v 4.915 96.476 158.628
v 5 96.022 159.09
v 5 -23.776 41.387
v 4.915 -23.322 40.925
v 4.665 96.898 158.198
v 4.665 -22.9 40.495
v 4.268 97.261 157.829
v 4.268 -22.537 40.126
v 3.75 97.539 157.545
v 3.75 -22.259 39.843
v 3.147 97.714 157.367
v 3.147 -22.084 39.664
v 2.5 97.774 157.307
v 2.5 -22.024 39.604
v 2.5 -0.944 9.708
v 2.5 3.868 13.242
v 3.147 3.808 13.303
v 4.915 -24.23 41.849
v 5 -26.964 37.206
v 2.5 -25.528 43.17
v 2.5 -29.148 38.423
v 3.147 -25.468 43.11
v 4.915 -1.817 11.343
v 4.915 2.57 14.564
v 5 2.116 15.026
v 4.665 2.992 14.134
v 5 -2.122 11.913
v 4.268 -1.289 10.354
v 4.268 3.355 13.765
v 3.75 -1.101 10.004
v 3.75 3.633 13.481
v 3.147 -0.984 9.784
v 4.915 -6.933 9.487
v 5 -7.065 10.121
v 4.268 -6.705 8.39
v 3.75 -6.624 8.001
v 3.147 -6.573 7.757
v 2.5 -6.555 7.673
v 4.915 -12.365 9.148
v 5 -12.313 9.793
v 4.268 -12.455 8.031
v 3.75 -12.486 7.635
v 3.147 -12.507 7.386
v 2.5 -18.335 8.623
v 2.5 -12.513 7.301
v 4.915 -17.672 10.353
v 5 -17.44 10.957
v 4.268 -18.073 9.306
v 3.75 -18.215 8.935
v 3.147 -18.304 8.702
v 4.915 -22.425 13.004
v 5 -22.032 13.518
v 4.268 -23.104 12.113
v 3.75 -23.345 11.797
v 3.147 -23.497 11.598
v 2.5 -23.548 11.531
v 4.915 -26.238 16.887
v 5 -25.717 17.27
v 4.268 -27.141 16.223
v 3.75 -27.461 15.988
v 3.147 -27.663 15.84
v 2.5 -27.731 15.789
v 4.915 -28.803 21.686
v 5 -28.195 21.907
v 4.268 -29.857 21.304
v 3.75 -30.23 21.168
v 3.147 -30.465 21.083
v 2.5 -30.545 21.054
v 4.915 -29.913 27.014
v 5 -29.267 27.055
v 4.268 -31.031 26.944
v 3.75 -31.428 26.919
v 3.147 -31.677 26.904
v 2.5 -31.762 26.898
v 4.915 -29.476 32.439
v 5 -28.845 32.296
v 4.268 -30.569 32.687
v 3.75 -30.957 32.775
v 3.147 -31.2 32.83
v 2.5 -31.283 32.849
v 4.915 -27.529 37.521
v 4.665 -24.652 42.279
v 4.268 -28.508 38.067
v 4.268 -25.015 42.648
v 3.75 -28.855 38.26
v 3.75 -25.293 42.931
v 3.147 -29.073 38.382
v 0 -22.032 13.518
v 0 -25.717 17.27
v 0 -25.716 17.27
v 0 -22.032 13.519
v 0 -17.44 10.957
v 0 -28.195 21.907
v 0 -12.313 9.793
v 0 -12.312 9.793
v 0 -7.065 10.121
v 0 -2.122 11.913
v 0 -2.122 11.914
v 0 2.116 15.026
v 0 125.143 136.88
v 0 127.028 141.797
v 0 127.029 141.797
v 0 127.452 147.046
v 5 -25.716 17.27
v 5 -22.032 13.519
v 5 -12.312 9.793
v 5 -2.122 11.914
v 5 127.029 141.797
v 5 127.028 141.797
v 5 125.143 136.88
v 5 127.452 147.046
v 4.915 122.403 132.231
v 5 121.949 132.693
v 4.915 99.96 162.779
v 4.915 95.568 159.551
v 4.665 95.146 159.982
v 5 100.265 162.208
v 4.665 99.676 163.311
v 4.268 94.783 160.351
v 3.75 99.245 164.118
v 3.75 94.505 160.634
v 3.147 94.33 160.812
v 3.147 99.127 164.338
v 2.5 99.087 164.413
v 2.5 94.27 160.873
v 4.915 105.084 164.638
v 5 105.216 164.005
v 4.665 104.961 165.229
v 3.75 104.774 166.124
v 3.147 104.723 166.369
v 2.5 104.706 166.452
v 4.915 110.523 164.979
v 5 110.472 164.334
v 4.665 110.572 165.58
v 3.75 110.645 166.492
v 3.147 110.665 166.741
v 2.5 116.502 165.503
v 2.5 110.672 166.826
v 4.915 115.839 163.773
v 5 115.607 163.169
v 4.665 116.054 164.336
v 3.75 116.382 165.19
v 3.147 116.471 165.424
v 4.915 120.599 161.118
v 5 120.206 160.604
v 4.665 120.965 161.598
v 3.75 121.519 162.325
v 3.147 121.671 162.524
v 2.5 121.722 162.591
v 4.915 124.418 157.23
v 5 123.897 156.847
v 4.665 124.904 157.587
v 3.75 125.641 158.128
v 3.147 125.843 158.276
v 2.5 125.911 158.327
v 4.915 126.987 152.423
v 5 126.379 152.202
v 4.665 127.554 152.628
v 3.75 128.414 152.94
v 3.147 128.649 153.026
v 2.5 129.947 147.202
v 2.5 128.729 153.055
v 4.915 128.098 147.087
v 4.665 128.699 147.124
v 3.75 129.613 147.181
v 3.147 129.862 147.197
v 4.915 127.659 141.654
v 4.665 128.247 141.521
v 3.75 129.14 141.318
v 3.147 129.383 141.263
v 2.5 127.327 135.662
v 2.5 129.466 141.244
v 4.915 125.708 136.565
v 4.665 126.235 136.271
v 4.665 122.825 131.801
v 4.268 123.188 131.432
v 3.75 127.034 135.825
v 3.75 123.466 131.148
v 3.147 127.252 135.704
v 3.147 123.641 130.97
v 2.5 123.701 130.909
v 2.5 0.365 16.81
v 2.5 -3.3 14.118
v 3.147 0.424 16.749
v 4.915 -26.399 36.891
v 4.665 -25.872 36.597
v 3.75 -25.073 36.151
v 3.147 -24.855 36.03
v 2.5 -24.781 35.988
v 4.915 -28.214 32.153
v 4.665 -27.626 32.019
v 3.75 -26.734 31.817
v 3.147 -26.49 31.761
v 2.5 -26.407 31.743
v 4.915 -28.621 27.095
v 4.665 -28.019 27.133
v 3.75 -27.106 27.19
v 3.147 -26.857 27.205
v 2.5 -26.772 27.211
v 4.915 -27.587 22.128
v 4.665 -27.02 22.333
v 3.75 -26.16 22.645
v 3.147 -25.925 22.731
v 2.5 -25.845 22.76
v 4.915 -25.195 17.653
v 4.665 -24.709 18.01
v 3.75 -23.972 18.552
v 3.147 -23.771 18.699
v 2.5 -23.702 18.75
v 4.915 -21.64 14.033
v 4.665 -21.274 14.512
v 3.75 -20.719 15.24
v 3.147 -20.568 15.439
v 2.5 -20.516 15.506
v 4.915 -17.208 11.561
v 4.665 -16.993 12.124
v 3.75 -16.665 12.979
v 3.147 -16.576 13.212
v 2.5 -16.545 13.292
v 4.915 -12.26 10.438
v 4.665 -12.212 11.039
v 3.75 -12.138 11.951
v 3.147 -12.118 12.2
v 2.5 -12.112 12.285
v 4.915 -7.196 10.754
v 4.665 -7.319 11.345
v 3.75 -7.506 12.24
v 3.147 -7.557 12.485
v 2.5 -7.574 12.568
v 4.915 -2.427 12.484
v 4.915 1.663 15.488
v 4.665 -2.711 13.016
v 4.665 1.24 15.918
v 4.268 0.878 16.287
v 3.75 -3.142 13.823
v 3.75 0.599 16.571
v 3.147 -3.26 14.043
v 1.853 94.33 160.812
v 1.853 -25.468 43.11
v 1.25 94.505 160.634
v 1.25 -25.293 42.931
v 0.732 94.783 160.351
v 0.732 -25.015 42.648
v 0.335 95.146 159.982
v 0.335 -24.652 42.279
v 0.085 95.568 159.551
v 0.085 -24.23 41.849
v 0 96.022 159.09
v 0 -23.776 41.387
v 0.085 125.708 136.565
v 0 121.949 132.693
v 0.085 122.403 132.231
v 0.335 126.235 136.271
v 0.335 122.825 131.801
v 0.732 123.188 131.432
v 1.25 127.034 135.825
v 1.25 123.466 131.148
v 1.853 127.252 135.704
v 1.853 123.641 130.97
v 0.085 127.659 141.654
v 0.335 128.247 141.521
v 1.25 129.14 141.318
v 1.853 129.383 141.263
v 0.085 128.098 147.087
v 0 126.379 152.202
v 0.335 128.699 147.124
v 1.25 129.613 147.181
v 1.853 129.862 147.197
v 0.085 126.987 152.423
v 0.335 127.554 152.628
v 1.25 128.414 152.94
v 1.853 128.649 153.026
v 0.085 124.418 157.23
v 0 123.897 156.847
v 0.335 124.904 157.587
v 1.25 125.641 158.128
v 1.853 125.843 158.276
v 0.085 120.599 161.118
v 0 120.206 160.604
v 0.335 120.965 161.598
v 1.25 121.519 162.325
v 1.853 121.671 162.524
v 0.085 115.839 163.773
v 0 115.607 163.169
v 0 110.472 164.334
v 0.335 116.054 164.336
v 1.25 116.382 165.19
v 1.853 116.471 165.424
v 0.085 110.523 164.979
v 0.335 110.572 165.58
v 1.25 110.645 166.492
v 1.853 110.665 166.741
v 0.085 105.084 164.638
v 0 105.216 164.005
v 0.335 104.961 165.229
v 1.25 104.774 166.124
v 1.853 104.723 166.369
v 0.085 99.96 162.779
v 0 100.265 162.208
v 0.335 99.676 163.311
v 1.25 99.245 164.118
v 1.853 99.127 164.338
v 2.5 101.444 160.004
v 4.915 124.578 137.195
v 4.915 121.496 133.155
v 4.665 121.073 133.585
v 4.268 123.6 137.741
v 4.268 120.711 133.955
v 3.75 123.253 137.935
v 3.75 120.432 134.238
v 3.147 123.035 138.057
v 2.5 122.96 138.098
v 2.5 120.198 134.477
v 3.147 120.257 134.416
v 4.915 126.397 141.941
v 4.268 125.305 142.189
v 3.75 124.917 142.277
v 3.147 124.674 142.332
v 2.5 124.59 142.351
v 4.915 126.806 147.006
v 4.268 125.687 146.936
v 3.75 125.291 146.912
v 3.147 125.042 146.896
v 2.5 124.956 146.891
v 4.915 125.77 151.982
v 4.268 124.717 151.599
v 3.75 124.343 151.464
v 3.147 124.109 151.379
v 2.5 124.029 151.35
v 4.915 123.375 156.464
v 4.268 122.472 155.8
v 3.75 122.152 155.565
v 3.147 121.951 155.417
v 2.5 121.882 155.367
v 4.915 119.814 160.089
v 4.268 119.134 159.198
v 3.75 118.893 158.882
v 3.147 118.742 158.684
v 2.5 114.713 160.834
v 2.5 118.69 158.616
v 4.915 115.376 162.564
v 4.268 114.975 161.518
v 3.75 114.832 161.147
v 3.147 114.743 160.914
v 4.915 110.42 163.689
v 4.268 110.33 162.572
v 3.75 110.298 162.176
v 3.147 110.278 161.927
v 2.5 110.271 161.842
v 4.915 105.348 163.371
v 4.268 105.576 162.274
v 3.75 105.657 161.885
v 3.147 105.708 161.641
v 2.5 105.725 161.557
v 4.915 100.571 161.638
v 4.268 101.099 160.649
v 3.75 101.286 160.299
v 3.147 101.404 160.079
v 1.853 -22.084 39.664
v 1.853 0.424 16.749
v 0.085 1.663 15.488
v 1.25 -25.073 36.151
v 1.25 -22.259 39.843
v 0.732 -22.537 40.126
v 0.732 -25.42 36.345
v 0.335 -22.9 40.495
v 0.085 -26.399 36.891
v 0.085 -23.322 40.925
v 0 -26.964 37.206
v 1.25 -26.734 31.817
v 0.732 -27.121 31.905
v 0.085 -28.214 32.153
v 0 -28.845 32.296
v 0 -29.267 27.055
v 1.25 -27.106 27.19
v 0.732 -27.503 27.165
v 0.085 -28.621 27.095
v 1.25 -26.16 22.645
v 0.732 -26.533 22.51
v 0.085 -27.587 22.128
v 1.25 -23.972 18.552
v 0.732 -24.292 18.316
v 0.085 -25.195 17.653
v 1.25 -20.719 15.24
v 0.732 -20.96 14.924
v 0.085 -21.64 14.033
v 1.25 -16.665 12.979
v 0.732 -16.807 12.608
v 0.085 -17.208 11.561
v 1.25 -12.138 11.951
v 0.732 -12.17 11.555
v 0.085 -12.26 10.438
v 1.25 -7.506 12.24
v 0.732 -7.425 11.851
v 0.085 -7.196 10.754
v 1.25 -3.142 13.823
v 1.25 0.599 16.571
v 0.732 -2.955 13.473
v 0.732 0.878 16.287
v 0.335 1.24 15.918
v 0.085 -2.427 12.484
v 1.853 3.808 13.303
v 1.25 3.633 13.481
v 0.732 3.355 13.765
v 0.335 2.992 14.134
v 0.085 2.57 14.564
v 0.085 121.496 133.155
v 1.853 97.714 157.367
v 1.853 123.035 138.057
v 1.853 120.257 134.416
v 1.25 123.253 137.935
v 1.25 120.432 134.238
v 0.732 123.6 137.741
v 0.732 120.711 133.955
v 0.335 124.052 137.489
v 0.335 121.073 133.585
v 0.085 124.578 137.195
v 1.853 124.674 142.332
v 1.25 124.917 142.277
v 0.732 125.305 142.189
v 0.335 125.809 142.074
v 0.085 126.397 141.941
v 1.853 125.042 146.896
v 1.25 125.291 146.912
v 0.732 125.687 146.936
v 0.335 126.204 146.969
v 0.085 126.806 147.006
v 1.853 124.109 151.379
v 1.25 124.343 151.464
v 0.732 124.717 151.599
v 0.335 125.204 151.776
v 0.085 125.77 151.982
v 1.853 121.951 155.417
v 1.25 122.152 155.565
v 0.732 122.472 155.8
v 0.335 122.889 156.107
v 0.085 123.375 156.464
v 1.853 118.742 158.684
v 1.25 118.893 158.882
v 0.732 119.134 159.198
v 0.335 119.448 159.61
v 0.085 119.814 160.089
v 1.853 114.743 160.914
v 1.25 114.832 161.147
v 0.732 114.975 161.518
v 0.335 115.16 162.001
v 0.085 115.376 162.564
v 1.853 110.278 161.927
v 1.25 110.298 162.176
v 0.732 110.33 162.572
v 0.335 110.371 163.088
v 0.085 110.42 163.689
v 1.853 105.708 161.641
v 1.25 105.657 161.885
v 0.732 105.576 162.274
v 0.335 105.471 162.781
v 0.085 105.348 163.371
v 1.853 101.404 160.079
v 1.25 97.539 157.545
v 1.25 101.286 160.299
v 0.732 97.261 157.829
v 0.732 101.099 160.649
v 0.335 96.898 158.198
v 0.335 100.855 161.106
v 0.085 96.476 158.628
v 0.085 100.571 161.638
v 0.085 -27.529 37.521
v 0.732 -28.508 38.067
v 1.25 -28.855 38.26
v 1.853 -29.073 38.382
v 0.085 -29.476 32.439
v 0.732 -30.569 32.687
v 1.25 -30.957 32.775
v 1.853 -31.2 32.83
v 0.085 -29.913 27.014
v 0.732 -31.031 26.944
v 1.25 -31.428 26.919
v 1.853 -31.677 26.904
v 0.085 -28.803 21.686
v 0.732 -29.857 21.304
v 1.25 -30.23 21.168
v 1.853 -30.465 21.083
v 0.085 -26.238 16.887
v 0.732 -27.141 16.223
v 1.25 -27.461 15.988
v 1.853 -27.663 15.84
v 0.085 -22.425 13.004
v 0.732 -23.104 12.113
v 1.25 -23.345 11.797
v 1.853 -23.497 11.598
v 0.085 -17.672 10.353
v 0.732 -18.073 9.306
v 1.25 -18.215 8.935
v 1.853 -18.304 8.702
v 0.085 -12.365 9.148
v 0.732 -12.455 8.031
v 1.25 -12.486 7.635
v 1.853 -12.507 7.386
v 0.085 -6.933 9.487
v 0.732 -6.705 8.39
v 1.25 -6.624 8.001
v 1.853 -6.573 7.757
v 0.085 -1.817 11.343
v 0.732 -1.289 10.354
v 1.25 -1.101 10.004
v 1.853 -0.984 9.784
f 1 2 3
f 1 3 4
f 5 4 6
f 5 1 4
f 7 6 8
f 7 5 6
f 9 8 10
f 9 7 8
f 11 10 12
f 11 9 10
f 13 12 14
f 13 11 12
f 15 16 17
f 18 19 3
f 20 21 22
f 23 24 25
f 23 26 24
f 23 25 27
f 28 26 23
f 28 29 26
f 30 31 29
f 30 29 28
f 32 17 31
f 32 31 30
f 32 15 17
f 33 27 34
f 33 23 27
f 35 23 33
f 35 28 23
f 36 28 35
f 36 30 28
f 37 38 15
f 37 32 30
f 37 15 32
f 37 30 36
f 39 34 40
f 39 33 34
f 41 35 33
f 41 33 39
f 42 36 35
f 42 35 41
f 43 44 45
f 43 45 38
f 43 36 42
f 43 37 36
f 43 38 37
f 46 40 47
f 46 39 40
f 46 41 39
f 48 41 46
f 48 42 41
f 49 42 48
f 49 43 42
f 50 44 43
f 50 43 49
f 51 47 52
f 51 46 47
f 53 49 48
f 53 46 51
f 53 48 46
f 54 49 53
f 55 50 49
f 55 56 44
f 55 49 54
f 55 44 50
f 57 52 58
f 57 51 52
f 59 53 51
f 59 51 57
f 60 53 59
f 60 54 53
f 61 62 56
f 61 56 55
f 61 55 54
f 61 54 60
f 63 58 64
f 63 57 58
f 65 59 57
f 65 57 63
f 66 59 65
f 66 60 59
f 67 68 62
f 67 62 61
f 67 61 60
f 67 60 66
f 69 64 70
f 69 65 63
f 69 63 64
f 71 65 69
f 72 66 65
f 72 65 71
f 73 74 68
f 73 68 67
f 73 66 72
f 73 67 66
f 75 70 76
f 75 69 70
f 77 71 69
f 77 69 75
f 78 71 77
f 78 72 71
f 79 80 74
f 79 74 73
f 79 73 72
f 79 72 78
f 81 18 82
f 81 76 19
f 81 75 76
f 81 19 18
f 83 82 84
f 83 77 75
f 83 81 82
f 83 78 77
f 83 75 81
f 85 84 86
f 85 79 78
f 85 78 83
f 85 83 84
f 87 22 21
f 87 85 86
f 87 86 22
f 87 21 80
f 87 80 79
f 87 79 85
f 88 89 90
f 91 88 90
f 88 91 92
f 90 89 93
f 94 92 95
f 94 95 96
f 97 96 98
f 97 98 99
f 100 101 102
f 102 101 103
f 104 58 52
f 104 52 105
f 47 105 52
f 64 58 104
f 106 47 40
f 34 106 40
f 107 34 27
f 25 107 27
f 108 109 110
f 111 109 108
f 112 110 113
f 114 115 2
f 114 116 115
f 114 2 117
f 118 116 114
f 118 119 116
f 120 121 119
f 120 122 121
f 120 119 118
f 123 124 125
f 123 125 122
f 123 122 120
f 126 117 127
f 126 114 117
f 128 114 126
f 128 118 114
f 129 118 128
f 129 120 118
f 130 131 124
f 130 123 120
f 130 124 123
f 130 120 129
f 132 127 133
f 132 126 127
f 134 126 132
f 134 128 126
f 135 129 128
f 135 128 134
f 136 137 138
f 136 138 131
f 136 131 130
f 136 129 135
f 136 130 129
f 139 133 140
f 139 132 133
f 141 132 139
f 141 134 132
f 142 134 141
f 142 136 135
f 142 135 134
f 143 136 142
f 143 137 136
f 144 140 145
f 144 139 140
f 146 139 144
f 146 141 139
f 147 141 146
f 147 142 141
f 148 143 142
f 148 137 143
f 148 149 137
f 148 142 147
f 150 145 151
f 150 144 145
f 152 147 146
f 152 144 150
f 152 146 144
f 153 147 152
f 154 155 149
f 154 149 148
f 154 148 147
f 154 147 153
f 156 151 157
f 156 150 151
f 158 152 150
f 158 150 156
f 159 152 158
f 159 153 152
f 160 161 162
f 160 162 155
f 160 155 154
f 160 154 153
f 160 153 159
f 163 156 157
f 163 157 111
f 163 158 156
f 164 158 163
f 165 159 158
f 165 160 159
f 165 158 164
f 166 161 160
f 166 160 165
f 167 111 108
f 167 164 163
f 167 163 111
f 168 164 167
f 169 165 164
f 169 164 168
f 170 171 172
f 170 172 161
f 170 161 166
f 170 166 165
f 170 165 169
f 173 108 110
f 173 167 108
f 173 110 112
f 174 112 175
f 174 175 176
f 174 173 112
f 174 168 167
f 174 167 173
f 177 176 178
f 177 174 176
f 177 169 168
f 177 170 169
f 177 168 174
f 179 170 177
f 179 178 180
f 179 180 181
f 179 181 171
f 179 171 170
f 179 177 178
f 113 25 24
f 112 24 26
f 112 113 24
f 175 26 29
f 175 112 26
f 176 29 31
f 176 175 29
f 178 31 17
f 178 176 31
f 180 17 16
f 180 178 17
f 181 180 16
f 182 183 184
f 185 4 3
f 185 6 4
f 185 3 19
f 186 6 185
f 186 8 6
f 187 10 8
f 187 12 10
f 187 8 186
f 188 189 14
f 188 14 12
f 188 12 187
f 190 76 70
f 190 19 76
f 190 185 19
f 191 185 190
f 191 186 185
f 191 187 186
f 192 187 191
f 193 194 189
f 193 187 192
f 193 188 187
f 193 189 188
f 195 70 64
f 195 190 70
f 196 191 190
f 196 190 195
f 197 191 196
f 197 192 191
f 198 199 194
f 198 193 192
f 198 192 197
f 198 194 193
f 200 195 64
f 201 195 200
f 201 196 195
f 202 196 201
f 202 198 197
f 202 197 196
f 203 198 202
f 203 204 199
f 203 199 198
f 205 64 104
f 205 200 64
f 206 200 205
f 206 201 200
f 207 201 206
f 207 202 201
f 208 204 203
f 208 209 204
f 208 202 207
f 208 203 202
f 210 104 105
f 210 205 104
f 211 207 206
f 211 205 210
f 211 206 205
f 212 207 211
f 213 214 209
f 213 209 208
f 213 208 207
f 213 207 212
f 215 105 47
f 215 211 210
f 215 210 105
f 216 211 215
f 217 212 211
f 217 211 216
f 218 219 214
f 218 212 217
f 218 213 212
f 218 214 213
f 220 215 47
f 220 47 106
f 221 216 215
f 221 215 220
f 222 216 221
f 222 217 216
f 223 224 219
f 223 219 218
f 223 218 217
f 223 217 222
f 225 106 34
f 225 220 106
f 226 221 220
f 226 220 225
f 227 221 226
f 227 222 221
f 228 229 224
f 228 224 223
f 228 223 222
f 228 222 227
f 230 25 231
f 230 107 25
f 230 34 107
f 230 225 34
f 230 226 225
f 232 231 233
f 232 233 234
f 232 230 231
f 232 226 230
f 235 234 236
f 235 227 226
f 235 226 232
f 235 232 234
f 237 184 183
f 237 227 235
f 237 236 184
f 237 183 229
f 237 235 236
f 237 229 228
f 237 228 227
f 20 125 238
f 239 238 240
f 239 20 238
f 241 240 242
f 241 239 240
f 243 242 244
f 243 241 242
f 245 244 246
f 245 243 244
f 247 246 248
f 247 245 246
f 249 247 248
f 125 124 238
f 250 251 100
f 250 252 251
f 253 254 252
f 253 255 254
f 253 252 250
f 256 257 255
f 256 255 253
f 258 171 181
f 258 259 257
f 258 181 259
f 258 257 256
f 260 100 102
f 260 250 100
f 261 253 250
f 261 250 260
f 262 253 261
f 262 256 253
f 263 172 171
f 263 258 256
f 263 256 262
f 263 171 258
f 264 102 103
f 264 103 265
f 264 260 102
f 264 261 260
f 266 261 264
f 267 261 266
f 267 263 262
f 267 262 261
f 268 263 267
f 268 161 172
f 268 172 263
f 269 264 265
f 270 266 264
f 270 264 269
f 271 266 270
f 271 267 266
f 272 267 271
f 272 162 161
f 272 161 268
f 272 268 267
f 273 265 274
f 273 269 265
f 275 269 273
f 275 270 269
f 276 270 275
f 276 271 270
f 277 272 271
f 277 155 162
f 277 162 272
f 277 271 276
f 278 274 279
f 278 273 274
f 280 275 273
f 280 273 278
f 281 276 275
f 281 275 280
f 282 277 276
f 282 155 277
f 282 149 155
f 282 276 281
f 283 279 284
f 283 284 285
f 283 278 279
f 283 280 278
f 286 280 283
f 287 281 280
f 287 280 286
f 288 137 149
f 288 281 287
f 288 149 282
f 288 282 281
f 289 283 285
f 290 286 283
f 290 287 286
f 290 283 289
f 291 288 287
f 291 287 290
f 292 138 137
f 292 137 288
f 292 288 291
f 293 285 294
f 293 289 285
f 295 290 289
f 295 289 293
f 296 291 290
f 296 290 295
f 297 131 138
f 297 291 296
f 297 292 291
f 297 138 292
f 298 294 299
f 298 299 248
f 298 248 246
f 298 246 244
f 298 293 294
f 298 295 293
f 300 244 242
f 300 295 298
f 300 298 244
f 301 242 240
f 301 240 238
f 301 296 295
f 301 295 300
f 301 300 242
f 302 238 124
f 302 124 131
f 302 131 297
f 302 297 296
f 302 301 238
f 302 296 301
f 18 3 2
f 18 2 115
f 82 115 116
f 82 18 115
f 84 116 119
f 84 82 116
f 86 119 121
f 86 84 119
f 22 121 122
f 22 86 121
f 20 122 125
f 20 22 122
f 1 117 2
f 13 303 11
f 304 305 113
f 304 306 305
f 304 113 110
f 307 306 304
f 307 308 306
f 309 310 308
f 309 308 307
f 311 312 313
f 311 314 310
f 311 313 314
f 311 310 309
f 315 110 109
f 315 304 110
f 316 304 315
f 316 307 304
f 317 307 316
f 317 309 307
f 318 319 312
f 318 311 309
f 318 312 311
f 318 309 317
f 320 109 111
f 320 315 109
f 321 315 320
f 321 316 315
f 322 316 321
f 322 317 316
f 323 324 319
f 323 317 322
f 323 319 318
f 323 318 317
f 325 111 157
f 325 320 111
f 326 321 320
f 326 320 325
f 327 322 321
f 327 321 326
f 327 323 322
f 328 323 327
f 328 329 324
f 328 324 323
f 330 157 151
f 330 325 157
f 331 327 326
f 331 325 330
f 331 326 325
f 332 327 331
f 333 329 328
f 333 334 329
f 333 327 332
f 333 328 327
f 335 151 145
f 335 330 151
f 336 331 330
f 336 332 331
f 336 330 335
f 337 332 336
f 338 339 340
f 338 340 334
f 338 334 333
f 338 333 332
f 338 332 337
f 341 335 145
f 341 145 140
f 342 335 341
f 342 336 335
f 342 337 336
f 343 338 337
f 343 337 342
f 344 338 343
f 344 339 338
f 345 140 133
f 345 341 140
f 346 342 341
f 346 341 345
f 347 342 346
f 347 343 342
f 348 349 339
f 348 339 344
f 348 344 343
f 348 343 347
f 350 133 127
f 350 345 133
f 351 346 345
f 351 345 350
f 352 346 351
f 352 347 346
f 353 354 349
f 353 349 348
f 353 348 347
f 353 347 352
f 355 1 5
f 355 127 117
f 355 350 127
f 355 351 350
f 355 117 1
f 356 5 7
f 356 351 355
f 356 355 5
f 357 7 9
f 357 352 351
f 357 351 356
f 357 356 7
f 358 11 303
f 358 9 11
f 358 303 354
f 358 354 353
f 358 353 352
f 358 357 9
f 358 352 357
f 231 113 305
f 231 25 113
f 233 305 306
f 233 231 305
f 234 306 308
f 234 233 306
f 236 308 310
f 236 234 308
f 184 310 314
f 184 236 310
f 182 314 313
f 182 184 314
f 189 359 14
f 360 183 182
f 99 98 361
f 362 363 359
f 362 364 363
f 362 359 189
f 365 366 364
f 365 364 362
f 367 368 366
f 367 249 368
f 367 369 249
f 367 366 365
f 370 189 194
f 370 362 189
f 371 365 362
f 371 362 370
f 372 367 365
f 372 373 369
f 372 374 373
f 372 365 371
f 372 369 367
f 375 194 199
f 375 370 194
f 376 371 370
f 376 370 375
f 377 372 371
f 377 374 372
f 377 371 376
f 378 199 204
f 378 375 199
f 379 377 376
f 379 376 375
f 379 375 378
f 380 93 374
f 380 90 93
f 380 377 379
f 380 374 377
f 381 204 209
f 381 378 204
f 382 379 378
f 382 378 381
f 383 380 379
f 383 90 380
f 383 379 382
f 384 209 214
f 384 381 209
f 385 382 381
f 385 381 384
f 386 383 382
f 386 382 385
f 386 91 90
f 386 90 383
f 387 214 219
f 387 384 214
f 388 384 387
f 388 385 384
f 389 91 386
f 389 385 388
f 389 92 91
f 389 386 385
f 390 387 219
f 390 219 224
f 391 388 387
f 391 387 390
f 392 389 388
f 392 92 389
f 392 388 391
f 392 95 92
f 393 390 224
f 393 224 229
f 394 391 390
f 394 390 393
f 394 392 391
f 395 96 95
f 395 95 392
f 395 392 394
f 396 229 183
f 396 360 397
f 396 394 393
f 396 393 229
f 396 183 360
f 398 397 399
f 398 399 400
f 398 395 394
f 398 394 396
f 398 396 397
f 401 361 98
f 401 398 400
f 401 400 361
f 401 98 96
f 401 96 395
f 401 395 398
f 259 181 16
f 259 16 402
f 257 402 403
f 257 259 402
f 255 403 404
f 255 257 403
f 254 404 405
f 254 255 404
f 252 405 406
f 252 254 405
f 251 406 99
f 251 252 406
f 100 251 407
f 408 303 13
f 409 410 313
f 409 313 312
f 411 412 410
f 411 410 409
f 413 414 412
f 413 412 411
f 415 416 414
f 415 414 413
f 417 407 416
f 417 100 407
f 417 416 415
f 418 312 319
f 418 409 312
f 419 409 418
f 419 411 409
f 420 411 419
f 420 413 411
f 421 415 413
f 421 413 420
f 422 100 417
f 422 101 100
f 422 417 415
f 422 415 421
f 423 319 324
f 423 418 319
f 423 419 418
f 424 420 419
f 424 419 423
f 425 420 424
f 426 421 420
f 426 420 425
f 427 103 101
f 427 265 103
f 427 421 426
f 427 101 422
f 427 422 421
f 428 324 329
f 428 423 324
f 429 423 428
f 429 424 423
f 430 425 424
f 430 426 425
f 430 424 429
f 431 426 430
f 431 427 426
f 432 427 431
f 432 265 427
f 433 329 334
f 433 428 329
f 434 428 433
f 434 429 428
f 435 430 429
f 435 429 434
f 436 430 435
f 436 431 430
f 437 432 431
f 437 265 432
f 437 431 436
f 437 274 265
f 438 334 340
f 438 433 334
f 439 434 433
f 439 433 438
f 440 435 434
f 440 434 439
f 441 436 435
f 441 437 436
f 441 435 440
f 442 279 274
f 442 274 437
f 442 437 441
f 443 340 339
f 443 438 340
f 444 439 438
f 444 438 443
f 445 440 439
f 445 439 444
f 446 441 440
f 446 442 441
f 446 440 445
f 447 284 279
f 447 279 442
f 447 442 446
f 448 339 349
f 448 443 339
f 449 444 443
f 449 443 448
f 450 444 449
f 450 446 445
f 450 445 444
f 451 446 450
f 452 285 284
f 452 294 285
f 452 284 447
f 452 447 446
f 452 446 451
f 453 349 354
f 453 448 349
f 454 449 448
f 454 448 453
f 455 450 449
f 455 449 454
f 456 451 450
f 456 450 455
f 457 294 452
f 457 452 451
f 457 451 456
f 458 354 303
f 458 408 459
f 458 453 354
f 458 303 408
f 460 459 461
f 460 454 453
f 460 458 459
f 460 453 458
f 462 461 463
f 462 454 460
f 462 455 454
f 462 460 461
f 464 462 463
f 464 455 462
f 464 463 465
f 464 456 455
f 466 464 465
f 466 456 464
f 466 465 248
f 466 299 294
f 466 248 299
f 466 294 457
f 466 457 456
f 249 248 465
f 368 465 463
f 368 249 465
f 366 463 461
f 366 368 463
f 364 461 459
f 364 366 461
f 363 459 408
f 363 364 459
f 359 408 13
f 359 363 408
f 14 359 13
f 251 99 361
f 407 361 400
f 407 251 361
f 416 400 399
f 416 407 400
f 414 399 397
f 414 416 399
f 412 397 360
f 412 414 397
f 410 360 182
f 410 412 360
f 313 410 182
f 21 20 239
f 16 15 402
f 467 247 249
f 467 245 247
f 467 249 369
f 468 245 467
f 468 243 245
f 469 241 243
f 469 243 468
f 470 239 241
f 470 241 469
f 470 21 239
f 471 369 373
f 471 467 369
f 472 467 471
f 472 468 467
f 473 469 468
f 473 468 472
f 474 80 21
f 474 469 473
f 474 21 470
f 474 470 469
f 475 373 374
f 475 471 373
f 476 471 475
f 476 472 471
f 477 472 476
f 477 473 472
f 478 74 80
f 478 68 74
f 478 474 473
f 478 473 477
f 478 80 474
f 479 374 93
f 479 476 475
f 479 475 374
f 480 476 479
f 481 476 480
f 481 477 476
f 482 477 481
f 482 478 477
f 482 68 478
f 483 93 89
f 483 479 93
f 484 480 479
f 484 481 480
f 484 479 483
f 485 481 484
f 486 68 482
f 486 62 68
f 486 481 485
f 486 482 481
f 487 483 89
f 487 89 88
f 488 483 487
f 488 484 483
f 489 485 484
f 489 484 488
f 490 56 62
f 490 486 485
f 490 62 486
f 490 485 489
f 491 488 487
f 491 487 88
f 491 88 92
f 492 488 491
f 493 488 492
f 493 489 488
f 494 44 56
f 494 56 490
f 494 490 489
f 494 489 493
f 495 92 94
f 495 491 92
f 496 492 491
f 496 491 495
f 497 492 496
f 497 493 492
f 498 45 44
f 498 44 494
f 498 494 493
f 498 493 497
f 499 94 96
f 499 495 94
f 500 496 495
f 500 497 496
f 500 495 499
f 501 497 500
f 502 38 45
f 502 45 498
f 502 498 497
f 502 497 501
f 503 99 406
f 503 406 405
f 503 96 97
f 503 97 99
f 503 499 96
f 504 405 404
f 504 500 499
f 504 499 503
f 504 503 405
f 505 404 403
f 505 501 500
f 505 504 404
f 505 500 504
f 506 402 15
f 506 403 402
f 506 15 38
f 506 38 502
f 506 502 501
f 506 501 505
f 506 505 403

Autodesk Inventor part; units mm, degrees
ref_plane "YZ Plane" through (0, 0, 0) normal (1, 0, 0) x (0, 1, 0)
ref_plane "XZ Plane" through (0, 0, 0) normal (0, 1, 0) x (-1, 0, 0)
ref_plane "XY Plane" through (0, 0, 0) normal (0, 0, 1) x (1, 0, 0)
sketch "Sketch1" plane through (0, 0, 0) normal (1, 0, 0) x (0, 1, 0)
  circle A0 centre (-10.828, 28.2084) radius 15.975 projected
  circle A1 centre (108.9876, 145.8935) radius 16
  line L0 (0.3646, 16.8099) -> (120.1977, 134.4771)
  line L1 (-22.0239, 39.6037) -> (97.7741, 157.3065)
  circle A2 centre (-10.828, 28.2084) radius 20.975
  line L2 (-25.5281, 43.1703) -> (94.2699, 160.8731)
  line L3 (3.8677, 13.2422) -> (123.7008, 130.9094)
  circle A3 centre (108.9876, 145.8935) radius 21
  point P0 (0, 0)
  dimension "d0" = 5
  dimension "d1" = 5
  dimension "d2" = 5
  dimension "d3" = 5
extrude "Extrusion1" add sketch "Sketch1" along normal blind 5 contours A0 L0 A2 L1 | A2 L2 A3 L1 | L0 A3 L3 A2 | A3 L0 A1 L1 picked at (6.4932, 21.5544) picked at (91.6433, 152.5567)
fillet "Fillet1" radius 2.5 16 edges at (0, -25.792, 13.5105) (0, 63.7843, 72.0758) (0, 123.9694, 160.6089) (0, 34.3709, 102.0217) (5, -25.792, 13.5105) (5, 63.7843, 72.0758) (5, 123.9694, 160.6089) (5, 34.3709, 102.0217) (5, 120.4023, 157.1052) (5, 60.2811, 75.6435) (5, -22.2249, 17.0142) (5, 37.8751, 98.4551) (0, -22.2249, 17.0142) (0, 37.8751, 98.4551) (0, 120.4023, 157.1052) (0, 60.2811, 75.6435)
properties part number "belt"
